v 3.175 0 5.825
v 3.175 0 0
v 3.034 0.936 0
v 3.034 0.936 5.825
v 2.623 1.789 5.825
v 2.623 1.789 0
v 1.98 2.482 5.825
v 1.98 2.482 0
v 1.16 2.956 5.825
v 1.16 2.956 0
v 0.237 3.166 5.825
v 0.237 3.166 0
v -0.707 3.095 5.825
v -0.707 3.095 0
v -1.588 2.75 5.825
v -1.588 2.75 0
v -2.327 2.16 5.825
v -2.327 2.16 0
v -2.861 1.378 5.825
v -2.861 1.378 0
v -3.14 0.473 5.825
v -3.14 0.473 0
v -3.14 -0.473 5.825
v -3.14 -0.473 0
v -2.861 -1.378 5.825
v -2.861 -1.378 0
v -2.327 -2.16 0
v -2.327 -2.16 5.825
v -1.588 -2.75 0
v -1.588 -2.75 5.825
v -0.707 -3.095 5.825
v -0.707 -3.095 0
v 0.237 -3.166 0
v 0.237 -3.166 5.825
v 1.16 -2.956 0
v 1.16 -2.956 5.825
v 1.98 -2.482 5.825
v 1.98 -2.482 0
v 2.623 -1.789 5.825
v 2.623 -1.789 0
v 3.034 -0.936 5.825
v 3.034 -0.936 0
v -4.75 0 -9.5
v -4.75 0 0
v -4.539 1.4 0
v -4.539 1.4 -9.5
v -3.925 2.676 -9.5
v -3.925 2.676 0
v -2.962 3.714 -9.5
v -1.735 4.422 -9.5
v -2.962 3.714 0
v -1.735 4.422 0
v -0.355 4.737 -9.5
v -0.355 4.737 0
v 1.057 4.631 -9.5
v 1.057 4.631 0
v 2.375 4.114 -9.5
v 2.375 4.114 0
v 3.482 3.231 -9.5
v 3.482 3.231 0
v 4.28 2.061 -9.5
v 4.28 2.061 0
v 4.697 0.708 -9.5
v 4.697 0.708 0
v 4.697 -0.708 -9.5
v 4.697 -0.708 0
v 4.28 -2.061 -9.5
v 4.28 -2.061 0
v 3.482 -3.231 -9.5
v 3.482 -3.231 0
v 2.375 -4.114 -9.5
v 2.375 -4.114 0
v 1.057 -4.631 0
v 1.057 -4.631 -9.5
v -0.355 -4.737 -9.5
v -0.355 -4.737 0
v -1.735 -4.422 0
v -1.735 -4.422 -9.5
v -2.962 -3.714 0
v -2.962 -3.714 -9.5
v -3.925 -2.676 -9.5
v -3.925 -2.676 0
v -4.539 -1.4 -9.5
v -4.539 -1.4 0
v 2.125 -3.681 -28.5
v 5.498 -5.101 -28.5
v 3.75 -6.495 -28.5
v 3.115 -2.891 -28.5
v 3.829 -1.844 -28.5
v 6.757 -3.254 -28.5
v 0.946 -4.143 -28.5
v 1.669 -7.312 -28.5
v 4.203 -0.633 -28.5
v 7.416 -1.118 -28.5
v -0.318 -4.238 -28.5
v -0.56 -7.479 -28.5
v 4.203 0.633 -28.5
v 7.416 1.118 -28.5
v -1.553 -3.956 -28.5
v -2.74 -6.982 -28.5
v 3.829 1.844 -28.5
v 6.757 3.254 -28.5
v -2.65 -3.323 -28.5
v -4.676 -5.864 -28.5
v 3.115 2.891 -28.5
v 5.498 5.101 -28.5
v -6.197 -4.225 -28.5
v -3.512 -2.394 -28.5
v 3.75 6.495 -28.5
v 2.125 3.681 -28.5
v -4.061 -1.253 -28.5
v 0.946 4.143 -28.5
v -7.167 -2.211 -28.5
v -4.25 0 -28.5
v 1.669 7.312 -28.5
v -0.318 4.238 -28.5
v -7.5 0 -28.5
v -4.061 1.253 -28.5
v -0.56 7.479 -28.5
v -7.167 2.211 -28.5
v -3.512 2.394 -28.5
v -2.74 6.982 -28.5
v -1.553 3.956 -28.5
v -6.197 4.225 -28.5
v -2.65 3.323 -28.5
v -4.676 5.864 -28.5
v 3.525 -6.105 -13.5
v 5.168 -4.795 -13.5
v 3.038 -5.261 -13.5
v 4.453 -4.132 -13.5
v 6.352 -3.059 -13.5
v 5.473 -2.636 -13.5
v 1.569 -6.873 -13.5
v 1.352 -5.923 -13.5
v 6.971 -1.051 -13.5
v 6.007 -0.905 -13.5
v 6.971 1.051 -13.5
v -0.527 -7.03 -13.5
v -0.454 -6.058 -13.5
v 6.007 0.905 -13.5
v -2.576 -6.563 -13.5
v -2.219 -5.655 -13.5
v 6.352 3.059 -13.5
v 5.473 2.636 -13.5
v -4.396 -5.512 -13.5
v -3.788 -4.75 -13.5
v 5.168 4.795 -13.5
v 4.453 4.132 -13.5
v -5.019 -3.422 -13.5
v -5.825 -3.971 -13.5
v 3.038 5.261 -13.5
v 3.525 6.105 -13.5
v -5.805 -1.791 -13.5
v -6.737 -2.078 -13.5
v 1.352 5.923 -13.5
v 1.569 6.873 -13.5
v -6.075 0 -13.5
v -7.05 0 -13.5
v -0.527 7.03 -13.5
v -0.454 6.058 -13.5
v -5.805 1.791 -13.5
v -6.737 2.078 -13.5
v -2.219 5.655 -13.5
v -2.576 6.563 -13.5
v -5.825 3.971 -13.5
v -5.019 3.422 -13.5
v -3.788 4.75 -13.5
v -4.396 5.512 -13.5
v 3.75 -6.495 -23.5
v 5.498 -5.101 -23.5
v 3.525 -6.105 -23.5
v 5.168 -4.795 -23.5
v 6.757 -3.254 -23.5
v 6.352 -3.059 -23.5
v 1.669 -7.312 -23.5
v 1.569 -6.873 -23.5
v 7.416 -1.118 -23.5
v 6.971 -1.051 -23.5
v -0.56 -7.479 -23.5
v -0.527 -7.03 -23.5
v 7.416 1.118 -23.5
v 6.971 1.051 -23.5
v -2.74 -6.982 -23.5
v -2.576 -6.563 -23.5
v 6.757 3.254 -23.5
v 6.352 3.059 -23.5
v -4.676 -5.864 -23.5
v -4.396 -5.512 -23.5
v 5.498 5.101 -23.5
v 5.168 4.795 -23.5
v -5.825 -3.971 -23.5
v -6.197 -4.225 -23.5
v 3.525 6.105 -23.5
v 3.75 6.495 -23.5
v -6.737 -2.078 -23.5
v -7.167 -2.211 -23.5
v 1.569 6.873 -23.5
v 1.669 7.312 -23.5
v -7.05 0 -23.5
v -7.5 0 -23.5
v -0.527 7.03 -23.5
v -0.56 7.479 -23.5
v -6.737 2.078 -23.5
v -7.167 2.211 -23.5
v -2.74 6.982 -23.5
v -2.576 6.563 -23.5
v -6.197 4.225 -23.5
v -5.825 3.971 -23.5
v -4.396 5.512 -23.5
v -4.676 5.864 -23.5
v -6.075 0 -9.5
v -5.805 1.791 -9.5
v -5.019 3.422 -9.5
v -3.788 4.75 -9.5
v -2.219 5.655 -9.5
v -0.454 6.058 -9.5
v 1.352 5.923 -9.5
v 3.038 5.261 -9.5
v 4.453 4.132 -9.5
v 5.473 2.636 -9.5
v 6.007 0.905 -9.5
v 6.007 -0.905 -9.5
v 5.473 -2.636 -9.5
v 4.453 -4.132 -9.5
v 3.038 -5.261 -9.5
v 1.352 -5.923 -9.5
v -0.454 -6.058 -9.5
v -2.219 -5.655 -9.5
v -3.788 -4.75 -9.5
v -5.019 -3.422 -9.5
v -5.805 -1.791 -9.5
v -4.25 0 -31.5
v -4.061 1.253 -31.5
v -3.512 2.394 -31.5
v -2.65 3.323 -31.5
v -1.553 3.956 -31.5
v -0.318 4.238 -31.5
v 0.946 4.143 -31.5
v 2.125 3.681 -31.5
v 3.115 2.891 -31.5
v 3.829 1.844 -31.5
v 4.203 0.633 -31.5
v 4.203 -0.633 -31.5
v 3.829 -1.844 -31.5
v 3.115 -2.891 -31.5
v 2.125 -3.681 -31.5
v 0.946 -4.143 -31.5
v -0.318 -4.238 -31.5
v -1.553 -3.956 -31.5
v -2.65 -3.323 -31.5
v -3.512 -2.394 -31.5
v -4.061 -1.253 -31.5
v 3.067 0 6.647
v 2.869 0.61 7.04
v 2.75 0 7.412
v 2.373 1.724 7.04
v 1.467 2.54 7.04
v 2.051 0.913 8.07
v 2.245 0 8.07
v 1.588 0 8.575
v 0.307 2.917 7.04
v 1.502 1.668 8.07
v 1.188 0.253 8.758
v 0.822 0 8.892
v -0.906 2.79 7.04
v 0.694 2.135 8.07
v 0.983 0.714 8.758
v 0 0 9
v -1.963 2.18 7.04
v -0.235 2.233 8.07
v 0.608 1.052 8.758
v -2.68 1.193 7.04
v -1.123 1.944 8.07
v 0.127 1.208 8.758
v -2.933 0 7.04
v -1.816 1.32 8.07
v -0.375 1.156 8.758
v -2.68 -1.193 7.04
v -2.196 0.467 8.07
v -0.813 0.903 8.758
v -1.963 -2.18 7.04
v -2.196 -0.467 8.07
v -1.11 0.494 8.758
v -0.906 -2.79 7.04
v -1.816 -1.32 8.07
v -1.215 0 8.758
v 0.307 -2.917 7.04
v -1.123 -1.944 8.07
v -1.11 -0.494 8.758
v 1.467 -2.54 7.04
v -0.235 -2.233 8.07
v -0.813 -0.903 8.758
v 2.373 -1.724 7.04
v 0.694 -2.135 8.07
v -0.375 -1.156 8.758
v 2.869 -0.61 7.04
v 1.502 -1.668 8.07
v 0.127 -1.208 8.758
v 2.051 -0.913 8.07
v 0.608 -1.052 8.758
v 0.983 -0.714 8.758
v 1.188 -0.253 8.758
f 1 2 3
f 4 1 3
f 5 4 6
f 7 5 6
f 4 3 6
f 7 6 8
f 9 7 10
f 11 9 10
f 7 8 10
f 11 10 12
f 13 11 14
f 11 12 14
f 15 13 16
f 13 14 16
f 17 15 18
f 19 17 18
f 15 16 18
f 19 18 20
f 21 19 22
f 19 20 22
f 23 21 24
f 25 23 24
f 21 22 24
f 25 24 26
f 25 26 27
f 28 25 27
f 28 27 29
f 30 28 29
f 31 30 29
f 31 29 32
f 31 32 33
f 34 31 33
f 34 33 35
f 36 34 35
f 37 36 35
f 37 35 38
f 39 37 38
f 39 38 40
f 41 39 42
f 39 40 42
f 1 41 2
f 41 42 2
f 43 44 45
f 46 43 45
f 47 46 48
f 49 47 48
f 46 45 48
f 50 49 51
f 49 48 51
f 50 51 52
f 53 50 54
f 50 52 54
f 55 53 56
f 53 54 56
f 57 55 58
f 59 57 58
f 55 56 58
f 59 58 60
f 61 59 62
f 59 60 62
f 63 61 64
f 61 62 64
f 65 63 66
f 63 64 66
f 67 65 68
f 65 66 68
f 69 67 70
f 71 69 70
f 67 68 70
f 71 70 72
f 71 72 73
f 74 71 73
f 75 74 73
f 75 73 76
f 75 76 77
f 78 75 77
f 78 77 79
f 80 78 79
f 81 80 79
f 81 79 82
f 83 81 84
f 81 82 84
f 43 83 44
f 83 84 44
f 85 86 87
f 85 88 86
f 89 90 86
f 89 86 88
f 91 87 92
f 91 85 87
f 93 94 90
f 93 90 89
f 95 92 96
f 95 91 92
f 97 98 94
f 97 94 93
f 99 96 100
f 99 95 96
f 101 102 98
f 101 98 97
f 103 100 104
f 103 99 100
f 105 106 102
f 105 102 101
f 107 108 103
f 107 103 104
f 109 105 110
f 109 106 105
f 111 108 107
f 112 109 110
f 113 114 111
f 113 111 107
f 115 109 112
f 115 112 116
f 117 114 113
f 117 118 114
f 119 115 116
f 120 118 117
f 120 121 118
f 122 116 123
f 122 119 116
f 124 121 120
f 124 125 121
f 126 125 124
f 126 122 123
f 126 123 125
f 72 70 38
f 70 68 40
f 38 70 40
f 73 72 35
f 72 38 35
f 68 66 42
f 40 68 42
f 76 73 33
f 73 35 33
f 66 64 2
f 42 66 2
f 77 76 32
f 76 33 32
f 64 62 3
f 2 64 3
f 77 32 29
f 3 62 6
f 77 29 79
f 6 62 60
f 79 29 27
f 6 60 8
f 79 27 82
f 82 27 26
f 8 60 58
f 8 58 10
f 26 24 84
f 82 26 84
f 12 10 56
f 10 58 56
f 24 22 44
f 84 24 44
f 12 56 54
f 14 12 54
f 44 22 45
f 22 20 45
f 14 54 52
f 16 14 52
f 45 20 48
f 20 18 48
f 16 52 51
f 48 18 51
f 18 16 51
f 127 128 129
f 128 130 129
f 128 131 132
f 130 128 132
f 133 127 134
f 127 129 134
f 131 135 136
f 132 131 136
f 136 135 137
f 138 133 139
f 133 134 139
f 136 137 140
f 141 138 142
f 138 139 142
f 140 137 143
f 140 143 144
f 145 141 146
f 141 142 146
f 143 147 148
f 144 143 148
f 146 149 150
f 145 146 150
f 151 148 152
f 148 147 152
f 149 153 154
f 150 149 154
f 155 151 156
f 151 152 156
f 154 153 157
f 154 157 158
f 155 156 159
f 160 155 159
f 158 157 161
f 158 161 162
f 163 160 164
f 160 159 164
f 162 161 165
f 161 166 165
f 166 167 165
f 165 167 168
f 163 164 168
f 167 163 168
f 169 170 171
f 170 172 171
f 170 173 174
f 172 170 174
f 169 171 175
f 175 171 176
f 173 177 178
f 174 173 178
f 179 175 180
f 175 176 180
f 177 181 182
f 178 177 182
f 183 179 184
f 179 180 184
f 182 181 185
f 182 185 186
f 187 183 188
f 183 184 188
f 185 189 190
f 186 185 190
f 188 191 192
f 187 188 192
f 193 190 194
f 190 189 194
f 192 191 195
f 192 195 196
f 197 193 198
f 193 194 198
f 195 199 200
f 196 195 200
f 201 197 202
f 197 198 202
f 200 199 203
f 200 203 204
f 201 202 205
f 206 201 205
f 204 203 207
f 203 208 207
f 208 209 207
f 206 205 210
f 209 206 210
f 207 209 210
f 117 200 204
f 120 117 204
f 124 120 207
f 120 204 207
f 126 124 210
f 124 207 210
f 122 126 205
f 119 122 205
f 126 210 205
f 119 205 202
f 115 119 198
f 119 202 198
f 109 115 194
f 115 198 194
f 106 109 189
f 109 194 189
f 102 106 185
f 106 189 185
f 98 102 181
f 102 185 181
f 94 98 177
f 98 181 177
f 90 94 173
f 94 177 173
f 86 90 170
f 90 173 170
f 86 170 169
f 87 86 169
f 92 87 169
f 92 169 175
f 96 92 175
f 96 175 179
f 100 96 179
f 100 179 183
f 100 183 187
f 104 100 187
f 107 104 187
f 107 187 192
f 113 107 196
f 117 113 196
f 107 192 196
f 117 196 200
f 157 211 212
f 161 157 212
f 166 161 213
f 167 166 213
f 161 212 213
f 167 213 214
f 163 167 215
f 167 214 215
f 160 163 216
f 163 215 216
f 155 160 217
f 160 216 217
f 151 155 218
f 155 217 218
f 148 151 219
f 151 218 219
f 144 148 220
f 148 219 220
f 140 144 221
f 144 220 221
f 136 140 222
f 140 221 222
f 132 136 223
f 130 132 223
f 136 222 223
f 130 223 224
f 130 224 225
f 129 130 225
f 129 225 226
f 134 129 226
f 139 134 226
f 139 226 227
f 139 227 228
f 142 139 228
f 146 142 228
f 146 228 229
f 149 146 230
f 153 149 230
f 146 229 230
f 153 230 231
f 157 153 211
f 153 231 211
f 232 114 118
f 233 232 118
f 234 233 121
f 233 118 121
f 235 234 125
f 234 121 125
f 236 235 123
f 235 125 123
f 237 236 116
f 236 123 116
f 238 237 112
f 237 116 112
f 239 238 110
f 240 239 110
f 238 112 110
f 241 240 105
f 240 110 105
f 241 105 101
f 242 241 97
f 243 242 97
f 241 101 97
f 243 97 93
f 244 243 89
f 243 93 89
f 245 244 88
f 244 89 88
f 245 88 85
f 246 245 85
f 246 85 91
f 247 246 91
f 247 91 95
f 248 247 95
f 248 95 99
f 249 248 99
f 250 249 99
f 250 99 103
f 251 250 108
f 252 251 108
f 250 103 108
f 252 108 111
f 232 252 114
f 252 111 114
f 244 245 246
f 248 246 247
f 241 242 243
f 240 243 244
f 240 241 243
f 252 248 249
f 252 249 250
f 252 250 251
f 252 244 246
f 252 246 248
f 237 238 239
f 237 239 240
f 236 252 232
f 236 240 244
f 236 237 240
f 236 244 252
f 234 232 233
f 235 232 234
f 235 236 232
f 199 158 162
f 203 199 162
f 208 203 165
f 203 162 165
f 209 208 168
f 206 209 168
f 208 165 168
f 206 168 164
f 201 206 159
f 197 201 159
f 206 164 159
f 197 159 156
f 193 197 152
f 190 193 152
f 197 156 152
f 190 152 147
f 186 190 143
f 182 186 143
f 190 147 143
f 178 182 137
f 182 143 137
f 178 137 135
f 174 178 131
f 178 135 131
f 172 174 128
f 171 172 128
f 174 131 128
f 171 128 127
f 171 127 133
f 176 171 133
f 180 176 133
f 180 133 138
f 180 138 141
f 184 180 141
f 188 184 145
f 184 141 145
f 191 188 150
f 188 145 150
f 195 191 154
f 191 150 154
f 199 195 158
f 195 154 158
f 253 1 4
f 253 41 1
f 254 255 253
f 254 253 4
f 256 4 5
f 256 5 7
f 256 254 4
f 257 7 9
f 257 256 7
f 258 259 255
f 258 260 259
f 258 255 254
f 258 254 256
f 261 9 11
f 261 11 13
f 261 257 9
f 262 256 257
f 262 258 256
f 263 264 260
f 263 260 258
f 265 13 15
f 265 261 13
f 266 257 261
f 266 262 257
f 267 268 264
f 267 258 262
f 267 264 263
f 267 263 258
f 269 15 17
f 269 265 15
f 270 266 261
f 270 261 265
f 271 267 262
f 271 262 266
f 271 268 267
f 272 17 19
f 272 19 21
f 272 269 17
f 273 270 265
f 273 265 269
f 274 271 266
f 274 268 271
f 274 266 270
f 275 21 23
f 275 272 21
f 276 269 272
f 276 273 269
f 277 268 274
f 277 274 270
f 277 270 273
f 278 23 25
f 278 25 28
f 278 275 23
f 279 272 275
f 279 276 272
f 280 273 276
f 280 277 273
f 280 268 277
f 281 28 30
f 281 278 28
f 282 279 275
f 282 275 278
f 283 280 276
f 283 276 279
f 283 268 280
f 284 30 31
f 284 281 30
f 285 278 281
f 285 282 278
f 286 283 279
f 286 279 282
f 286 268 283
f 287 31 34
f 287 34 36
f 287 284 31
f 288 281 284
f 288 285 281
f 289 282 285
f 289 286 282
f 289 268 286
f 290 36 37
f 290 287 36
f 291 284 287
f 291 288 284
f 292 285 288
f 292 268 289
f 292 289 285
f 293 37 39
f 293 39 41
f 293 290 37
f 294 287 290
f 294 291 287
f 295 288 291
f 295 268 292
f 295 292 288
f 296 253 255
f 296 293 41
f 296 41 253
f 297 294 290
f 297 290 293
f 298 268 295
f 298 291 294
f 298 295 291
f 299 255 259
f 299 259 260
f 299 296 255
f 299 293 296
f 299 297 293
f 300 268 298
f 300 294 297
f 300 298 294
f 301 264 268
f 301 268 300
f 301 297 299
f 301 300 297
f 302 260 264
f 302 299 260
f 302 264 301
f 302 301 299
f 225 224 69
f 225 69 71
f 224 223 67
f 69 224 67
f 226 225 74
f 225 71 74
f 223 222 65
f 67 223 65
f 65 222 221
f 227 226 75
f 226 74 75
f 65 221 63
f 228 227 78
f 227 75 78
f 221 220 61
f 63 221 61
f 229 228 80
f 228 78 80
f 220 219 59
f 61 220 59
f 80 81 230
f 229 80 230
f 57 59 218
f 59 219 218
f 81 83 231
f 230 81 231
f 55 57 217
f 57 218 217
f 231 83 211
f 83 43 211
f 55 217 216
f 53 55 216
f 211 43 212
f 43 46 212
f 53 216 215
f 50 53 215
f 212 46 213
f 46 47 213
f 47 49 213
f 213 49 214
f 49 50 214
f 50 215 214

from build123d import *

# Parameters (mm, degrees)
SKETCH1_R           = 3.175
BOSS_EXTRUDE1_DEPTH = 9
SKETCH2_R           = 4.75
BOSS_EXTRUDE2_DEPTH = 9.5
SKETCH3_R           = 6.075
BOSS_EXTRUDE3_DEPTH = 4
SKETCH4_R           = 7.05
BOSS_EXTRUDE4_DEPTH = 10
SKETCH5_R           = 7.5
BOSS_EXTRUDE5_DEPTH = 5
SKETCH6_R           = 4.25
BOSS_EXTRUDE6_DEPTH = 3
FILLET1_R           = 3.175


with BuildPart() as part:
    # Sketch1 → Boss-Extrude1 (new body)
    with BuildSketch(Plane.XY):
        Circle(SKETCH1_R)
    extrude(amount=BOSS_EXTRUDE1_DEPTH)

    # Sketch2 → Boss-Extrude2 (add)
    with BuildSketch(Plane(origin=(0, 0, 0), x_dir=(-1, 0, 0), z_dir=(0, 0, -1))):
        Circle(SKETCH2_R)
    extrude(amount=BOSS_EXTRUDE2_DEPTH)

    # Sketch3 → Boss-Extrude3 (add)
    with BuildSketch(Plane(origin=(0, 0, -9.5), x_dir=(-1, 0, 0), z_dir=(0, 0, -1))):
        Circle(SKETCH3_R)
    extrude(amount=BOSS_EXTRUDE3_DEPTH)

    # Sketch4 → Boss-Extrude4 (add)
    with BuildSketch(Plane(origin=(0, 0, -13.5), x_dir=(-1, 0, 0), z_dir=(0, 0, -1))):
        Circle(SKETCH4_R)
    extrude(amount=BOSS_EXTRUDE4_DEPTH)

    # Sketch5 → Boss-Extrude5 (add)
    with BuildSketch(Plane(origin=(0, 0, -23.5), x_dir=(-1, 0, 0), z_dir=(0, 0, -1))):
        Circle(SKETCH5_R)
    extrude(amount=BOSS_EXTRUDE5_DEPTH)

    # Sketch6 → Boss-Extrude6 (add)
    with BuildSketch(Plane(origin=(0, 0, -28.5), x_dir=(-1, 0, 0), z_dir=(0, 0, -1))):
        Circle(SKETCH6_R)
    extrude(amount=BOSS_EXTRUDE6_DEPTH)

    # Fillet1
    fillet1_edges = [part.edges().sort_by_distance(p)[0] for p in [
        (-3.175, 0, 9),
    ]]
    fillet(fillet1_edges, radius=FILLET1_R)


solid = part.part
